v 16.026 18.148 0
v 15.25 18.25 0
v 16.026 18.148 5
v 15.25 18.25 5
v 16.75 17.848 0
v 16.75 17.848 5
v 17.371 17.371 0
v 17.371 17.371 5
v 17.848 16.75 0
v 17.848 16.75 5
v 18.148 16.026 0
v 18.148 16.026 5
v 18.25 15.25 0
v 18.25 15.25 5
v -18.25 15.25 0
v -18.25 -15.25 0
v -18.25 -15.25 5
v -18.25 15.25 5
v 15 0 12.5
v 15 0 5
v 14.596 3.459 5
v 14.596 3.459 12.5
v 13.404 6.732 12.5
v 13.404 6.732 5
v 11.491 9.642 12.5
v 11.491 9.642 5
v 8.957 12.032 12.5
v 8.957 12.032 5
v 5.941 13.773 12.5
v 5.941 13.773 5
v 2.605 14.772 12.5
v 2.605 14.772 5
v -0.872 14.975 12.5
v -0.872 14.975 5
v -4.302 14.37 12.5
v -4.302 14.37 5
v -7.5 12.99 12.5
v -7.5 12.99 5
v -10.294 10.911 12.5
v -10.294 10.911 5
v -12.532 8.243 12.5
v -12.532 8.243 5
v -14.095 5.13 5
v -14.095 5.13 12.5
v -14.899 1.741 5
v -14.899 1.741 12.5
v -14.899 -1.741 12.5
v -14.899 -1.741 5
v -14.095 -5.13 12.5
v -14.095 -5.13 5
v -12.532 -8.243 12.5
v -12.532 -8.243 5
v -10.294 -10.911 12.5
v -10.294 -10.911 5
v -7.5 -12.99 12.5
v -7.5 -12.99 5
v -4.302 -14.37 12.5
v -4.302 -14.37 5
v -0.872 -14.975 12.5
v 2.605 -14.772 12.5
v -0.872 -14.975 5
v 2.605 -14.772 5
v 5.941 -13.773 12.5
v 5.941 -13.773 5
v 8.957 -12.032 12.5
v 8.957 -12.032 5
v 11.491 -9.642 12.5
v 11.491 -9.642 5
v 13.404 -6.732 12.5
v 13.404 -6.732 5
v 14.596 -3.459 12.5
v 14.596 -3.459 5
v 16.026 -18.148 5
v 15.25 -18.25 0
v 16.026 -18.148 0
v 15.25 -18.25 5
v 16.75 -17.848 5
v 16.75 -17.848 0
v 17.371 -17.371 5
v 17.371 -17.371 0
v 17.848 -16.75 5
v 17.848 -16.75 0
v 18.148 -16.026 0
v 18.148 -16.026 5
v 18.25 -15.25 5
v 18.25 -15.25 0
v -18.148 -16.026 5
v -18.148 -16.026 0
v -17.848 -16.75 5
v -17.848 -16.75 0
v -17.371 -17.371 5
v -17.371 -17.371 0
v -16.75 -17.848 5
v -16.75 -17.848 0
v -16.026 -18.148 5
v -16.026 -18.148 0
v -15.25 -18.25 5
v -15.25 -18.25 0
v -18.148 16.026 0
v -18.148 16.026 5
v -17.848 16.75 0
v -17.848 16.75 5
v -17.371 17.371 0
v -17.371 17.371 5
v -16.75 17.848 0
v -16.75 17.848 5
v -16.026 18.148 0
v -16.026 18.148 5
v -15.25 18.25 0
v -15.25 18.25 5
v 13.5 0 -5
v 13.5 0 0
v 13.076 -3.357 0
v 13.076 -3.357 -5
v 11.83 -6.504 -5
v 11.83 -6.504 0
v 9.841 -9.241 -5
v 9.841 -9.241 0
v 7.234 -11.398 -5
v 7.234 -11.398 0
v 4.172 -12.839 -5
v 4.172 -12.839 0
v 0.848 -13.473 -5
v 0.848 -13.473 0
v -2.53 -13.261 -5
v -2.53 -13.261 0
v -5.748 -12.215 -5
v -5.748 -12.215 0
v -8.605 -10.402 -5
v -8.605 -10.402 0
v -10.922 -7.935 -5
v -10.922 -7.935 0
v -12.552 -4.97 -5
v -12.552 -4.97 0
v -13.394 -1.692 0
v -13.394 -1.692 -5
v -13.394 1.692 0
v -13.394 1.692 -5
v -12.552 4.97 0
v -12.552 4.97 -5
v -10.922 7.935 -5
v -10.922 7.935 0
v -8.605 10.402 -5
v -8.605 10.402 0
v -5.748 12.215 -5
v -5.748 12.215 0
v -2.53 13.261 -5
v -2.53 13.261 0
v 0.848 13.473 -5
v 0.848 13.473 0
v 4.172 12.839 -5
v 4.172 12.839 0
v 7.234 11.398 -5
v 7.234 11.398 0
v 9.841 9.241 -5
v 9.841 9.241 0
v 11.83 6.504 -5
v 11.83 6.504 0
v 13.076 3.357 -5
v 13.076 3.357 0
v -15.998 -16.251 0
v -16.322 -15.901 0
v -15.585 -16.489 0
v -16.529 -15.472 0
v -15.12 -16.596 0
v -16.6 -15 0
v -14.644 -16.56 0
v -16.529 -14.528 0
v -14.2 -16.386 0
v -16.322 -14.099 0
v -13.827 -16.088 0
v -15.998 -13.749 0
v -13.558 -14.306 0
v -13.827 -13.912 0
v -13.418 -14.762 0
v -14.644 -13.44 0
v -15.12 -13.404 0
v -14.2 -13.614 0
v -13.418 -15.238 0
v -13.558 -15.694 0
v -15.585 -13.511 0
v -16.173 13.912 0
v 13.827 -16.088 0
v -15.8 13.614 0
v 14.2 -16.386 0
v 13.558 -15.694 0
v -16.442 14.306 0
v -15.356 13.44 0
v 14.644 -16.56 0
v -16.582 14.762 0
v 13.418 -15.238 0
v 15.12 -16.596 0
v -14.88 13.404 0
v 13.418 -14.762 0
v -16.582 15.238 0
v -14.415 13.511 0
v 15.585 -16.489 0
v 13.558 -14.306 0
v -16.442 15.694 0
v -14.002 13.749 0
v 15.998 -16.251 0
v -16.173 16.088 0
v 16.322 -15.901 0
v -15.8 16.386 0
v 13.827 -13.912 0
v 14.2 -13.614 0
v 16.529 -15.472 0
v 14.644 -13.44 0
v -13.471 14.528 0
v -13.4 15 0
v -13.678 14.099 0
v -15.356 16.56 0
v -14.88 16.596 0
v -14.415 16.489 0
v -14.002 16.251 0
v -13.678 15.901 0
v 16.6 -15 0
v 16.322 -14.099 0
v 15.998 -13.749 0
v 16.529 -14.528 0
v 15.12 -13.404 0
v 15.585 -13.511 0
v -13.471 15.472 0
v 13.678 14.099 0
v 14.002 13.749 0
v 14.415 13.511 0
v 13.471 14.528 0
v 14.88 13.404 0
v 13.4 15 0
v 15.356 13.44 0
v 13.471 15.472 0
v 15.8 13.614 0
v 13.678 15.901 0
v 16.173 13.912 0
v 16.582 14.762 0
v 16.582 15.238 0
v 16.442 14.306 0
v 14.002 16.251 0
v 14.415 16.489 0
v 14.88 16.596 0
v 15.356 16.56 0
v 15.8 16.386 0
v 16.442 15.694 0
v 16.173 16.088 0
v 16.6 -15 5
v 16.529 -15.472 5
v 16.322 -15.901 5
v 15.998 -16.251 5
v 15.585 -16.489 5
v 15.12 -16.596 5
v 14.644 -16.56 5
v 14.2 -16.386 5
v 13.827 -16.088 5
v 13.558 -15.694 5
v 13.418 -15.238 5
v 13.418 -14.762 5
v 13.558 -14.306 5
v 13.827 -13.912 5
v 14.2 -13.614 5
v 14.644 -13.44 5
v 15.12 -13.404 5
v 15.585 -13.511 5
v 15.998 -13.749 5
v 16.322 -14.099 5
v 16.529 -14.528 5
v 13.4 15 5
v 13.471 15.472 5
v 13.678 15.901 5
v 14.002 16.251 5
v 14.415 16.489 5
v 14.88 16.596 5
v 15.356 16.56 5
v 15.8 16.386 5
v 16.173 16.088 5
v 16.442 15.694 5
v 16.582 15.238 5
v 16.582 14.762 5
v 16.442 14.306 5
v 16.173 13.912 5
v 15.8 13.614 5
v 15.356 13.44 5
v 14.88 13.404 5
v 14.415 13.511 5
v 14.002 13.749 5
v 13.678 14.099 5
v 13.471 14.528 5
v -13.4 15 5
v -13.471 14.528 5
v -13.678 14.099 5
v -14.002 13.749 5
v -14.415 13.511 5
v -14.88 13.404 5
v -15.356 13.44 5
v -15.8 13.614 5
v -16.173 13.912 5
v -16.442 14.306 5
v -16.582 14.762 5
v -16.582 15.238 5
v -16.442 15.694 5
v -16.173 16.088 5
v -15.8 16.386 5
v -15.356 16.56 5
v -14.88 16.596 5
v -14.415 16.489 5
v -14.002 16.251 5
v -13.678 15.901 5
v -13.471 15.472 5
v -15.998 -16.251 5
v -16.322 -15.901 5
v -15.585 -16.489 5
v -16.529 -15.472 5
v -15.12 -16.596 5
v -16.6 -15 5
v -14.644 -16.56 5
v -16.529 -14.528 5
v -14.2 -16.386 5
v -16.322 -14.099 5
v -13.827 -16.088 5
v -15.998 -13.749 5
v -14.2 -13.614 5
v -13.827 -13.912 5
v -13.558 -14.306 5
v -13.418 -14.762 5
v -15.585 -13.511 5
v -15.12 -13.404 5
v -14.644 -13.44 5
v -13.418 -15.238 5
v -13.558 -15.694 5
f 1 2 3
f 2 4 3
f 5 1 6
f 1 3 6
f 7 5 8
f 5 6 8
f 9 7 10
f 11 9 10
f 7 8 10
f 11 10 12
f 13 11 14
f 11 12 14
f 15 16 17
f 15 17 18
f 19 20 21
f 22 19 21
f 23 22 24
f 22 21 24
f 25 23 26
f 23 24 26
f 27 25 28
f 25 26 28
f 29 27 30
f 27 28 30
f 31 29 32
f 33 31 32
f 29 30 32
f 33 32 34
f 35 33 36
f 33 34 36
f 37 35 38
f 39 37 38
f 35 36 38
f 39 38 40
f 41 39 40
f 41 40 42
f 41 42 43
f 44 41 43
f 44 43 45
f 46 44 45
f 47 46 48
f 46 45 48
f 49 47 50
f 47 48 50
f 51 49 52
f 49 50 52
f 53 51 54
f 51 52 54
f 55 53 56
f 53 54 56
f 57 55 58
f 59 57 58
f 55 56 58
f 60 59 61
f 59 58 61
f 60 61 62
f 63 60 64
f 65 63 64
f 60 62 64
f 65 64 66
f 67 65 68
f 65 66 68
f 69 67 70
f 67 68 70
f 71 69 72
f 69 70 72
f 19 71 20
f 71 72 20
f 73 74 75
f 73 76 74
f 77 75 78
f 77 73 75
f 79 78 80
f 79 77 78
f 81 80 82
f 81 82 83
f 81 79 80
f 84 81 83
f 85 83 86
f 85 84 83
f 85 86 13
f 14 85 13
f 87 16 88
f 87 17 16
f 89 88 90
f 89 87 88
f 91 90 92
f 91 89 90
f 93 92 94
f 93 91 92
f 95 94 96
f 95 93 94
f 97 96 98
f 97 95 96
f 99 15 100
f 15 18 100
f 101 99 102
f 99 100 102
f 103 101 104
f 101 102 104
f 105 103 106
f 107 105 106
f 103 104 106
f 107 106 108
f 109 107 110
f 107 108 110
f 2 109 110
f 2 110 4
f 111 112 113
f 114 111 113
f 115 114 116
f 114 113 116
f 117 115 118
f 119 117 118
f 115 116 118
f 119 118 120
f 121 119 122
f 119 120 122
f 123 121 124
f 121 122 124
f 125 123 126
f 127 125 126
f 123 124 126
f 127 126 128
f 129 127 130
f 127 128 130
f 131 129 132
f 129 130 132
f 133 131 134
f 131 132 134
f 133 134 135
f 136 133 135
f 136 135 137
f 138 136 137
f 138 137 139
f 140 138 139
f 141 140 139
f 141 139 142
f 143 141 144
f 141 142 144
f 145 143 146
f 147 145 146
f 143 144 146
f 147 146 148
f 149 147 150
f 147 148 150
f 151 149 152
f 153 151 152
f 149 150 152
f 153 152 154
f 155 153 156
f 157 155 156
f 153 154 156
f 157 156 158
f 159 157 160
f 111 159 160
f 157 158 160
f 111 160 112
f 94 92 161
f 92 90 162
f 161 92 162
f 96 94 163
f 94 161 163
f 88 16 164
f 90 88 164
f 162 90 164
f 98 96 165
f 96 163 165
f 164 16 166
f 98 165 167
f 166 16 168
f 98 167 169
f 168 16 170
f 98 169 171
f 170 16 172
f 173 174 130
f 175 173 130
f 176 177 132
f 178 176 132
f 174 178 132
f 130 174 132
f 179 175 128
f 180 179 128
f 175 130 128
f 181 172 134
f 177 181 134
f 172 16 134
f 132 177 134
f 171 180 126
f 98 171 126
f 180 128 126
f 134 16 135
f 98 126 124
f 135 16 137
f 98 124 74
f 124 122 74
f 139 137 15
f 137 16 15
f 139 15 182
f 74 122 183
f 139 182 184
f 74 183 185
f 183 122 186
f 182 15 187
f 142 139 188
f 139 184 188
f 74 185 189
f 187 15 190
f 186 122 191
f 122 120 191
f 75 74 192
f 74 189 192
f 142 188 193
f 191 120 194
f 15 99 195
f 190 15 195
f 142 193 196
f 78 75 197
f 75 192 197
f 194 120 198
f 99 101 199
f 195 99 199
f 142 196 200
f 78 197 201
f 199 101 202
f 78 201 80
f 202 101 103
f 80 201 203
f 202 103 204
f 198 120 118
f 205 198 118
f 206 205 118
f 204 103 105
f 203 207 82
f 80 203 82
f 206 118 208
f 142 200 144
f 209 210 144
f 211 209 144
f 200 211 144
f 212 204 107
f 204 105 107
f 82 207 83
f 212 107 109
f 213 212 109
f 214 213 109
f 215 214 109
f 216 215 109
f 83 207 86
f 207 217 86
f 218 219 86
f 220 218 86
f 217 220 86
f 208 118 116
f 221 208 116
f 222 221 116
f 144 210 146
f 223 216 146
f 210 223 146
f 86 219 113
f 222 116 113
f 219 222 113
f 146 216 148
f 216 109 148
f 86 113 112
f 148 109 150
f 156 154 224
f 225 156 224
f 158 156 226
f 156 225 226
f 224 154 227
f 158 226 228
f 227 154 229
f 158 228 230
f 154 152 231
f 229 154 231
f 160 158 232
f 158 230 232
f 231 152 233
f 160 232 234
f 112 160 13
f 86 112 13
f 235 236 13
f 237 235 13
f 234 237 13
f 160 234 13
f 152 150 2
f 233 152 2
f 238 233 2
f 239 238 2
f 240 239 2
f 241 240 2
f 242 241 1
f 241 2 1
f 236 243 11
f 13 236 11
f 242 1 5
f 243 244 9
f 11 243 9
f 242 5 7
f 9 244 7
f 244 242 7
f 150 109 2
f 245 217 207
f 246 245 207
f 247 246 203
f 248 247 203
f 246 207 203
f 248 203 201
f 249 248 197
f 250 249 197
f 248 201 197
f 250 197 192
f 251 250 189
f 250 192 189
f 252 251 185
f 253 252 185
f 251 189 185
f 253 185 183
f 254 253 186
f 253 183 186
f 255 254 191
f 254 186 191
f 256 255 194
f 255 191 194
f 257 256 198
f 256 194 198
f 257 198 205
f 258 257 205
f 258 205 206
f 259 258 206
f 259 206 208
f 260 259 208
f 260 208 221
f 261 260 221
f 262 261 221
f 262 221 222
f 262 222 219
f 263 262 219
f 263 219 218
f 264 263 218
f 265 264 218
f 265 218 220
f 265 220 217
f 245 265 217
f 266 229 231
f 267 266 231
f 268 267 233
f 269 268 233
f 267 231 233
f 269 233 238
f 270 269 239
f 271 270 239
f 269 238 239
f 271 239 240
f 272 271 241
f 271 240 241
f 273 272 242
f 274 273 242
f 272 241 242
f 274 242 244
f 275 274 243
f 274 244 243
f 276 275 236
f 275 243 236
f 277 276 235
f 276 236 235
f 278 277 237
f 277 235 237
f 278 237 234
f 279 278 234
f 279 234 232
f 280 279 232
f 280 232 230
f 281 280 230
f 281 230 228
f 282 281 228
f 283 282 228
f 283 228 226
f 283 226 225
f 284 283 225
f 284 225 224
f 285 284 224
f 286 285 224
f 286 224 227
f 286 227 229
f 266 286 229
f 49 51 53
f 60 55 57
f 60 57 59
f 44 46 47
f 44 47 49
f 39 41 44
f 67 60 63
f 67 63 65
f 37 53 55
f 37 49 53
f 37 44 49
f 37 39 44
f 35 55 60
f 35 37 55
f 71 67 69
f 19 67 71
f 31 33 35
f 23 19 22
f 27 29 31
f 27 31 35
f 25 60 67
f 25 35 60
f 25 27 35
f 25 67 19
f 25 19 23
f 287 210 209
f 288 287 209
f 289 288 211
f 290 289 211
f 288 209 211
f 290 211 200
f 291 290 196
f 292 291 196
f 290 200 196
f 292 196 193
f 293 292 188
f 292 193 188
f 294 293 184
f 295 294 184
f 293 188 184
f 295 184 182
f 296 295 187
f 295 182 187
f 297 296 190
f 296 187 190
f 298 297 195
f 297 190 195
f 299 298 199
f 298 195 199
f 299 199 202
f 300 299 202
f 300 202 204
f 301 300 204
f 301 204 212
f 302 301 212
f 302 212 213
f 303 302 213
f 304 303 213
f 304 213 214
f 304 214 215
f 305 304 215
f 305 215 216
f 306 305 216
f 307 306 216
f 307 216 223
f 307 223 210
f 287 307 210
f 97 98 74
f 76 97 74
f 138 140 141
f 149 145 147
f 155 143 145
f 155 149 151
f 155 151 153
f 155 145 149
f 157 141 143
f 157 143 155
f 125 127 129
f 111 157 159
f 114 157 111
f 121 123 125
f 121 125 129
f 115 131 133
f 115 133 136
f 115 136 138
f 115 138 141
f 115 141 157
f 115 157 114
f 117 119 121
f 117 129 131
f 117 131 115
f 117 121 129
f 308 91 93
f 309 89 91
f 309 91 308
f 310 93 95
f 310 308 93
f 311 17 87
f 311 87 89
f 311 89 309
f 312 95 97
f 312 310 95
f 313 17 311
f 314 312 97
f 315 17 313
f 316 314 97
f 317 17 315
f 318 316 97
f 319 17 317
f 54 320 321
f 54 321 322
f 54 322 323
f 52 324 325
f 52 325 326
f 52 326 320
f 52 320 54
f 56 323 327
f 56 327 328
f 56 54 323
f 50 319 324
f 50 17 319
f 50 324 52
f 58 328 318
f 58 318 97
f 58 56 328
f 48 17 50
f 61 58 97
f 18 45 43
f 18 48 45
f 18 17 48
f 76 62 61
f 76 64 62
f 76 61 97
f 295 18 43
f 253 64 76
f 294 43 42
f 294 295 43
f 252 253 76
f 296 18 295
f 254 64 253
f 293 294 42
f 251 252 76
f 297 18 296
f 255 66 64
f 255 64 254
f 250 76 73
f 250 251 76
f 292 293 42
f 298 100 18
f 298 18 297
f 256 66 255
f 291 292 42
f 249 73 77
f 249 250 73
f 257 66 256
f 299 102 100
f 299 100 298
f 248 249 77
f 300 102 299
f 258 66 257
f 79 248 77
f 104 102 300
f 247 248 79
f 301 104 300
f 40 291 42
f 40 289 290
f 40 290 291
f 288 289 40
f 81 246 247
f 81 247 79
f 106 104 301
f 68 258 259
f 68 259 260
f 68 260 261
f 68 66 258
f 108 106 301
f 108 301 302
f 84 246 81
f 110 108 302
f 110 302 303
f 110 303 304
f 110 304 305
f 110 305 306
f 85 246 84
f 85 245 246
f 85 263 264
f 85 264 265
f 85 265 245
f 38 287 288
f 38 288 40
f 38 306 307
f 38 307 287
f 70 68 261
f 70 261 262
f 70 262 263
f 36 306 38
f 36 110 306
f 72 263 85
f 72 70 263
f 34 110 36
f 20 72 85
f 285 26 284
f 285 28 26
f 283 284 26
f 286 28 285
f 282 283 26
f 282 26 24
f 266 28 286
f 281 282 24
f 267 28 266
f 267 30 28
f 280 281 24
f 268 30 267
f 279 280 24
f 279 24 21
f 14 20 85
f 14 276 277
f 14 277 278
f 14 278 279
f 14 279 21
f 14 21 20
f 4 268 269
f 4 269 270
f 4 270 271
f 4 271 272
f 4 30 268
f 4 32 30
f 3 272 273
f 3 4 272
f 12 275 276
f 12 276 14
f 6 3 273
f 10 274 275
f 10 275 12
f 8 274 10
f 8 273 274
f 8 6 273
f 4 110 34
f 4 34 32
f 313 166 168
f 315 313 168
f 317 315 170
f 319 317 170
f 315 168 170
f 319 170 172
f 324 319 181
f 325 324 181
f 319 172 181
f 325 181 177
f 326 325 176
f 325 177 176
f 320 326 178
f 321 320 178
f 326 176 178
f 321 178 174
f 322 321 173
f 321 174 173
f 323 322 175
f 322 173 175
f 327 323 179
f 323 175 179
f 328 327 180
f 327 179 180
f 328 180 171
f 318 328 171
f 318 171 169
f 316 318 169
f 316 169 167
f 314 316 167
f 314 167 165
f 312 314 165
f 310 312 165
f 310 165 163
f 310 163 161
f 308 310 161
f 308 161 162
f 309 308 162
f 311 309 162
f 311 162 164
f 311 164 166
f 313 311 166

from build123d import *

# Parameters (mm, degrees)
SKETCH_1_W          = 36.5
SKETCH_1_H          = 36.5
EXTRUDE_1_DEPTH     = 5
SKETCH_2_R          = 15
EXTRUDE_2_DEPTH     = 7.5
SKETCH_3_R          = 13.5
EXTRUDE_3_DEPTH     = 5
SKETCH_4_R          = 1.6
CUT_EXTRUDE_1_DEPTH = 29.677081441
FILLET_1_R          = 3


with BuildPart() as part:
    # 草图1 → 凸台-拉伸1 (new body)
    with BuildSketch(Plane.XY):
        Rectangle(SKETCH_1_W, SKETCH_1_H)
    extrude(amount=EXTRUDE_1_DEPTH)

    # 草图2 → 凸台-拉伸2 (add)
    with BuildSketch(Plane.XY.offset(5)):
        Circle(SKETCH_2_R)
    extrude(amount=EXTRUDE_2_DEPTH)

    # 草图3 → 凸台-拉伸3 (add)
    with BuildSketch(Plane(origin=(0, 0, 0), x_dir=(-1, 0, 0), z_dir=(0, 0, -1))):
        with Locations(Location((0, 0, 0), (0, 0, 180))):
            Circle(SKETCH_3_R)
    extrude(amount=EXTRUDE_3_DEPTH)

    # 草图4 → 切除-拉伸1 (cut, through all)
    with BuildSketch(Plane(origin=(0, 0, 0), x_dir=(-1, 0, 0), z_dir=(0, 0, -1))):
        with Locations((-15, 15)):
            Circle(SKETCH_4_R)
        with Locations(Location((-15, -15, 0), (0, 0, 180))):
            Circle(SKETCH_4_R)
        with Locations((15, -15)):
            Circle(SKETCH_4_R)
        with Locations(Location((15, 15, 0), (0, 0, 180))):
            Circle(SKETCH_4_R)
    extrude(amount=-CUT_EXTRUDE_1_DEPTH, mode=Mode.SUBTRACT)

    # 圆角1
    fillet_1_edges = [part.edges().sort_by_distance(p)[0] for p in [
        (-18.25, 18.25, 2.5),
        (18.25, 18.25, 2.5),
        (18.25, -18.25, 2.5),
        (-18.25, -18.25, 2.5),
    ]]
    fillet(fillet_1_edges, radius=FILLET_1_R)


solid = part.part
